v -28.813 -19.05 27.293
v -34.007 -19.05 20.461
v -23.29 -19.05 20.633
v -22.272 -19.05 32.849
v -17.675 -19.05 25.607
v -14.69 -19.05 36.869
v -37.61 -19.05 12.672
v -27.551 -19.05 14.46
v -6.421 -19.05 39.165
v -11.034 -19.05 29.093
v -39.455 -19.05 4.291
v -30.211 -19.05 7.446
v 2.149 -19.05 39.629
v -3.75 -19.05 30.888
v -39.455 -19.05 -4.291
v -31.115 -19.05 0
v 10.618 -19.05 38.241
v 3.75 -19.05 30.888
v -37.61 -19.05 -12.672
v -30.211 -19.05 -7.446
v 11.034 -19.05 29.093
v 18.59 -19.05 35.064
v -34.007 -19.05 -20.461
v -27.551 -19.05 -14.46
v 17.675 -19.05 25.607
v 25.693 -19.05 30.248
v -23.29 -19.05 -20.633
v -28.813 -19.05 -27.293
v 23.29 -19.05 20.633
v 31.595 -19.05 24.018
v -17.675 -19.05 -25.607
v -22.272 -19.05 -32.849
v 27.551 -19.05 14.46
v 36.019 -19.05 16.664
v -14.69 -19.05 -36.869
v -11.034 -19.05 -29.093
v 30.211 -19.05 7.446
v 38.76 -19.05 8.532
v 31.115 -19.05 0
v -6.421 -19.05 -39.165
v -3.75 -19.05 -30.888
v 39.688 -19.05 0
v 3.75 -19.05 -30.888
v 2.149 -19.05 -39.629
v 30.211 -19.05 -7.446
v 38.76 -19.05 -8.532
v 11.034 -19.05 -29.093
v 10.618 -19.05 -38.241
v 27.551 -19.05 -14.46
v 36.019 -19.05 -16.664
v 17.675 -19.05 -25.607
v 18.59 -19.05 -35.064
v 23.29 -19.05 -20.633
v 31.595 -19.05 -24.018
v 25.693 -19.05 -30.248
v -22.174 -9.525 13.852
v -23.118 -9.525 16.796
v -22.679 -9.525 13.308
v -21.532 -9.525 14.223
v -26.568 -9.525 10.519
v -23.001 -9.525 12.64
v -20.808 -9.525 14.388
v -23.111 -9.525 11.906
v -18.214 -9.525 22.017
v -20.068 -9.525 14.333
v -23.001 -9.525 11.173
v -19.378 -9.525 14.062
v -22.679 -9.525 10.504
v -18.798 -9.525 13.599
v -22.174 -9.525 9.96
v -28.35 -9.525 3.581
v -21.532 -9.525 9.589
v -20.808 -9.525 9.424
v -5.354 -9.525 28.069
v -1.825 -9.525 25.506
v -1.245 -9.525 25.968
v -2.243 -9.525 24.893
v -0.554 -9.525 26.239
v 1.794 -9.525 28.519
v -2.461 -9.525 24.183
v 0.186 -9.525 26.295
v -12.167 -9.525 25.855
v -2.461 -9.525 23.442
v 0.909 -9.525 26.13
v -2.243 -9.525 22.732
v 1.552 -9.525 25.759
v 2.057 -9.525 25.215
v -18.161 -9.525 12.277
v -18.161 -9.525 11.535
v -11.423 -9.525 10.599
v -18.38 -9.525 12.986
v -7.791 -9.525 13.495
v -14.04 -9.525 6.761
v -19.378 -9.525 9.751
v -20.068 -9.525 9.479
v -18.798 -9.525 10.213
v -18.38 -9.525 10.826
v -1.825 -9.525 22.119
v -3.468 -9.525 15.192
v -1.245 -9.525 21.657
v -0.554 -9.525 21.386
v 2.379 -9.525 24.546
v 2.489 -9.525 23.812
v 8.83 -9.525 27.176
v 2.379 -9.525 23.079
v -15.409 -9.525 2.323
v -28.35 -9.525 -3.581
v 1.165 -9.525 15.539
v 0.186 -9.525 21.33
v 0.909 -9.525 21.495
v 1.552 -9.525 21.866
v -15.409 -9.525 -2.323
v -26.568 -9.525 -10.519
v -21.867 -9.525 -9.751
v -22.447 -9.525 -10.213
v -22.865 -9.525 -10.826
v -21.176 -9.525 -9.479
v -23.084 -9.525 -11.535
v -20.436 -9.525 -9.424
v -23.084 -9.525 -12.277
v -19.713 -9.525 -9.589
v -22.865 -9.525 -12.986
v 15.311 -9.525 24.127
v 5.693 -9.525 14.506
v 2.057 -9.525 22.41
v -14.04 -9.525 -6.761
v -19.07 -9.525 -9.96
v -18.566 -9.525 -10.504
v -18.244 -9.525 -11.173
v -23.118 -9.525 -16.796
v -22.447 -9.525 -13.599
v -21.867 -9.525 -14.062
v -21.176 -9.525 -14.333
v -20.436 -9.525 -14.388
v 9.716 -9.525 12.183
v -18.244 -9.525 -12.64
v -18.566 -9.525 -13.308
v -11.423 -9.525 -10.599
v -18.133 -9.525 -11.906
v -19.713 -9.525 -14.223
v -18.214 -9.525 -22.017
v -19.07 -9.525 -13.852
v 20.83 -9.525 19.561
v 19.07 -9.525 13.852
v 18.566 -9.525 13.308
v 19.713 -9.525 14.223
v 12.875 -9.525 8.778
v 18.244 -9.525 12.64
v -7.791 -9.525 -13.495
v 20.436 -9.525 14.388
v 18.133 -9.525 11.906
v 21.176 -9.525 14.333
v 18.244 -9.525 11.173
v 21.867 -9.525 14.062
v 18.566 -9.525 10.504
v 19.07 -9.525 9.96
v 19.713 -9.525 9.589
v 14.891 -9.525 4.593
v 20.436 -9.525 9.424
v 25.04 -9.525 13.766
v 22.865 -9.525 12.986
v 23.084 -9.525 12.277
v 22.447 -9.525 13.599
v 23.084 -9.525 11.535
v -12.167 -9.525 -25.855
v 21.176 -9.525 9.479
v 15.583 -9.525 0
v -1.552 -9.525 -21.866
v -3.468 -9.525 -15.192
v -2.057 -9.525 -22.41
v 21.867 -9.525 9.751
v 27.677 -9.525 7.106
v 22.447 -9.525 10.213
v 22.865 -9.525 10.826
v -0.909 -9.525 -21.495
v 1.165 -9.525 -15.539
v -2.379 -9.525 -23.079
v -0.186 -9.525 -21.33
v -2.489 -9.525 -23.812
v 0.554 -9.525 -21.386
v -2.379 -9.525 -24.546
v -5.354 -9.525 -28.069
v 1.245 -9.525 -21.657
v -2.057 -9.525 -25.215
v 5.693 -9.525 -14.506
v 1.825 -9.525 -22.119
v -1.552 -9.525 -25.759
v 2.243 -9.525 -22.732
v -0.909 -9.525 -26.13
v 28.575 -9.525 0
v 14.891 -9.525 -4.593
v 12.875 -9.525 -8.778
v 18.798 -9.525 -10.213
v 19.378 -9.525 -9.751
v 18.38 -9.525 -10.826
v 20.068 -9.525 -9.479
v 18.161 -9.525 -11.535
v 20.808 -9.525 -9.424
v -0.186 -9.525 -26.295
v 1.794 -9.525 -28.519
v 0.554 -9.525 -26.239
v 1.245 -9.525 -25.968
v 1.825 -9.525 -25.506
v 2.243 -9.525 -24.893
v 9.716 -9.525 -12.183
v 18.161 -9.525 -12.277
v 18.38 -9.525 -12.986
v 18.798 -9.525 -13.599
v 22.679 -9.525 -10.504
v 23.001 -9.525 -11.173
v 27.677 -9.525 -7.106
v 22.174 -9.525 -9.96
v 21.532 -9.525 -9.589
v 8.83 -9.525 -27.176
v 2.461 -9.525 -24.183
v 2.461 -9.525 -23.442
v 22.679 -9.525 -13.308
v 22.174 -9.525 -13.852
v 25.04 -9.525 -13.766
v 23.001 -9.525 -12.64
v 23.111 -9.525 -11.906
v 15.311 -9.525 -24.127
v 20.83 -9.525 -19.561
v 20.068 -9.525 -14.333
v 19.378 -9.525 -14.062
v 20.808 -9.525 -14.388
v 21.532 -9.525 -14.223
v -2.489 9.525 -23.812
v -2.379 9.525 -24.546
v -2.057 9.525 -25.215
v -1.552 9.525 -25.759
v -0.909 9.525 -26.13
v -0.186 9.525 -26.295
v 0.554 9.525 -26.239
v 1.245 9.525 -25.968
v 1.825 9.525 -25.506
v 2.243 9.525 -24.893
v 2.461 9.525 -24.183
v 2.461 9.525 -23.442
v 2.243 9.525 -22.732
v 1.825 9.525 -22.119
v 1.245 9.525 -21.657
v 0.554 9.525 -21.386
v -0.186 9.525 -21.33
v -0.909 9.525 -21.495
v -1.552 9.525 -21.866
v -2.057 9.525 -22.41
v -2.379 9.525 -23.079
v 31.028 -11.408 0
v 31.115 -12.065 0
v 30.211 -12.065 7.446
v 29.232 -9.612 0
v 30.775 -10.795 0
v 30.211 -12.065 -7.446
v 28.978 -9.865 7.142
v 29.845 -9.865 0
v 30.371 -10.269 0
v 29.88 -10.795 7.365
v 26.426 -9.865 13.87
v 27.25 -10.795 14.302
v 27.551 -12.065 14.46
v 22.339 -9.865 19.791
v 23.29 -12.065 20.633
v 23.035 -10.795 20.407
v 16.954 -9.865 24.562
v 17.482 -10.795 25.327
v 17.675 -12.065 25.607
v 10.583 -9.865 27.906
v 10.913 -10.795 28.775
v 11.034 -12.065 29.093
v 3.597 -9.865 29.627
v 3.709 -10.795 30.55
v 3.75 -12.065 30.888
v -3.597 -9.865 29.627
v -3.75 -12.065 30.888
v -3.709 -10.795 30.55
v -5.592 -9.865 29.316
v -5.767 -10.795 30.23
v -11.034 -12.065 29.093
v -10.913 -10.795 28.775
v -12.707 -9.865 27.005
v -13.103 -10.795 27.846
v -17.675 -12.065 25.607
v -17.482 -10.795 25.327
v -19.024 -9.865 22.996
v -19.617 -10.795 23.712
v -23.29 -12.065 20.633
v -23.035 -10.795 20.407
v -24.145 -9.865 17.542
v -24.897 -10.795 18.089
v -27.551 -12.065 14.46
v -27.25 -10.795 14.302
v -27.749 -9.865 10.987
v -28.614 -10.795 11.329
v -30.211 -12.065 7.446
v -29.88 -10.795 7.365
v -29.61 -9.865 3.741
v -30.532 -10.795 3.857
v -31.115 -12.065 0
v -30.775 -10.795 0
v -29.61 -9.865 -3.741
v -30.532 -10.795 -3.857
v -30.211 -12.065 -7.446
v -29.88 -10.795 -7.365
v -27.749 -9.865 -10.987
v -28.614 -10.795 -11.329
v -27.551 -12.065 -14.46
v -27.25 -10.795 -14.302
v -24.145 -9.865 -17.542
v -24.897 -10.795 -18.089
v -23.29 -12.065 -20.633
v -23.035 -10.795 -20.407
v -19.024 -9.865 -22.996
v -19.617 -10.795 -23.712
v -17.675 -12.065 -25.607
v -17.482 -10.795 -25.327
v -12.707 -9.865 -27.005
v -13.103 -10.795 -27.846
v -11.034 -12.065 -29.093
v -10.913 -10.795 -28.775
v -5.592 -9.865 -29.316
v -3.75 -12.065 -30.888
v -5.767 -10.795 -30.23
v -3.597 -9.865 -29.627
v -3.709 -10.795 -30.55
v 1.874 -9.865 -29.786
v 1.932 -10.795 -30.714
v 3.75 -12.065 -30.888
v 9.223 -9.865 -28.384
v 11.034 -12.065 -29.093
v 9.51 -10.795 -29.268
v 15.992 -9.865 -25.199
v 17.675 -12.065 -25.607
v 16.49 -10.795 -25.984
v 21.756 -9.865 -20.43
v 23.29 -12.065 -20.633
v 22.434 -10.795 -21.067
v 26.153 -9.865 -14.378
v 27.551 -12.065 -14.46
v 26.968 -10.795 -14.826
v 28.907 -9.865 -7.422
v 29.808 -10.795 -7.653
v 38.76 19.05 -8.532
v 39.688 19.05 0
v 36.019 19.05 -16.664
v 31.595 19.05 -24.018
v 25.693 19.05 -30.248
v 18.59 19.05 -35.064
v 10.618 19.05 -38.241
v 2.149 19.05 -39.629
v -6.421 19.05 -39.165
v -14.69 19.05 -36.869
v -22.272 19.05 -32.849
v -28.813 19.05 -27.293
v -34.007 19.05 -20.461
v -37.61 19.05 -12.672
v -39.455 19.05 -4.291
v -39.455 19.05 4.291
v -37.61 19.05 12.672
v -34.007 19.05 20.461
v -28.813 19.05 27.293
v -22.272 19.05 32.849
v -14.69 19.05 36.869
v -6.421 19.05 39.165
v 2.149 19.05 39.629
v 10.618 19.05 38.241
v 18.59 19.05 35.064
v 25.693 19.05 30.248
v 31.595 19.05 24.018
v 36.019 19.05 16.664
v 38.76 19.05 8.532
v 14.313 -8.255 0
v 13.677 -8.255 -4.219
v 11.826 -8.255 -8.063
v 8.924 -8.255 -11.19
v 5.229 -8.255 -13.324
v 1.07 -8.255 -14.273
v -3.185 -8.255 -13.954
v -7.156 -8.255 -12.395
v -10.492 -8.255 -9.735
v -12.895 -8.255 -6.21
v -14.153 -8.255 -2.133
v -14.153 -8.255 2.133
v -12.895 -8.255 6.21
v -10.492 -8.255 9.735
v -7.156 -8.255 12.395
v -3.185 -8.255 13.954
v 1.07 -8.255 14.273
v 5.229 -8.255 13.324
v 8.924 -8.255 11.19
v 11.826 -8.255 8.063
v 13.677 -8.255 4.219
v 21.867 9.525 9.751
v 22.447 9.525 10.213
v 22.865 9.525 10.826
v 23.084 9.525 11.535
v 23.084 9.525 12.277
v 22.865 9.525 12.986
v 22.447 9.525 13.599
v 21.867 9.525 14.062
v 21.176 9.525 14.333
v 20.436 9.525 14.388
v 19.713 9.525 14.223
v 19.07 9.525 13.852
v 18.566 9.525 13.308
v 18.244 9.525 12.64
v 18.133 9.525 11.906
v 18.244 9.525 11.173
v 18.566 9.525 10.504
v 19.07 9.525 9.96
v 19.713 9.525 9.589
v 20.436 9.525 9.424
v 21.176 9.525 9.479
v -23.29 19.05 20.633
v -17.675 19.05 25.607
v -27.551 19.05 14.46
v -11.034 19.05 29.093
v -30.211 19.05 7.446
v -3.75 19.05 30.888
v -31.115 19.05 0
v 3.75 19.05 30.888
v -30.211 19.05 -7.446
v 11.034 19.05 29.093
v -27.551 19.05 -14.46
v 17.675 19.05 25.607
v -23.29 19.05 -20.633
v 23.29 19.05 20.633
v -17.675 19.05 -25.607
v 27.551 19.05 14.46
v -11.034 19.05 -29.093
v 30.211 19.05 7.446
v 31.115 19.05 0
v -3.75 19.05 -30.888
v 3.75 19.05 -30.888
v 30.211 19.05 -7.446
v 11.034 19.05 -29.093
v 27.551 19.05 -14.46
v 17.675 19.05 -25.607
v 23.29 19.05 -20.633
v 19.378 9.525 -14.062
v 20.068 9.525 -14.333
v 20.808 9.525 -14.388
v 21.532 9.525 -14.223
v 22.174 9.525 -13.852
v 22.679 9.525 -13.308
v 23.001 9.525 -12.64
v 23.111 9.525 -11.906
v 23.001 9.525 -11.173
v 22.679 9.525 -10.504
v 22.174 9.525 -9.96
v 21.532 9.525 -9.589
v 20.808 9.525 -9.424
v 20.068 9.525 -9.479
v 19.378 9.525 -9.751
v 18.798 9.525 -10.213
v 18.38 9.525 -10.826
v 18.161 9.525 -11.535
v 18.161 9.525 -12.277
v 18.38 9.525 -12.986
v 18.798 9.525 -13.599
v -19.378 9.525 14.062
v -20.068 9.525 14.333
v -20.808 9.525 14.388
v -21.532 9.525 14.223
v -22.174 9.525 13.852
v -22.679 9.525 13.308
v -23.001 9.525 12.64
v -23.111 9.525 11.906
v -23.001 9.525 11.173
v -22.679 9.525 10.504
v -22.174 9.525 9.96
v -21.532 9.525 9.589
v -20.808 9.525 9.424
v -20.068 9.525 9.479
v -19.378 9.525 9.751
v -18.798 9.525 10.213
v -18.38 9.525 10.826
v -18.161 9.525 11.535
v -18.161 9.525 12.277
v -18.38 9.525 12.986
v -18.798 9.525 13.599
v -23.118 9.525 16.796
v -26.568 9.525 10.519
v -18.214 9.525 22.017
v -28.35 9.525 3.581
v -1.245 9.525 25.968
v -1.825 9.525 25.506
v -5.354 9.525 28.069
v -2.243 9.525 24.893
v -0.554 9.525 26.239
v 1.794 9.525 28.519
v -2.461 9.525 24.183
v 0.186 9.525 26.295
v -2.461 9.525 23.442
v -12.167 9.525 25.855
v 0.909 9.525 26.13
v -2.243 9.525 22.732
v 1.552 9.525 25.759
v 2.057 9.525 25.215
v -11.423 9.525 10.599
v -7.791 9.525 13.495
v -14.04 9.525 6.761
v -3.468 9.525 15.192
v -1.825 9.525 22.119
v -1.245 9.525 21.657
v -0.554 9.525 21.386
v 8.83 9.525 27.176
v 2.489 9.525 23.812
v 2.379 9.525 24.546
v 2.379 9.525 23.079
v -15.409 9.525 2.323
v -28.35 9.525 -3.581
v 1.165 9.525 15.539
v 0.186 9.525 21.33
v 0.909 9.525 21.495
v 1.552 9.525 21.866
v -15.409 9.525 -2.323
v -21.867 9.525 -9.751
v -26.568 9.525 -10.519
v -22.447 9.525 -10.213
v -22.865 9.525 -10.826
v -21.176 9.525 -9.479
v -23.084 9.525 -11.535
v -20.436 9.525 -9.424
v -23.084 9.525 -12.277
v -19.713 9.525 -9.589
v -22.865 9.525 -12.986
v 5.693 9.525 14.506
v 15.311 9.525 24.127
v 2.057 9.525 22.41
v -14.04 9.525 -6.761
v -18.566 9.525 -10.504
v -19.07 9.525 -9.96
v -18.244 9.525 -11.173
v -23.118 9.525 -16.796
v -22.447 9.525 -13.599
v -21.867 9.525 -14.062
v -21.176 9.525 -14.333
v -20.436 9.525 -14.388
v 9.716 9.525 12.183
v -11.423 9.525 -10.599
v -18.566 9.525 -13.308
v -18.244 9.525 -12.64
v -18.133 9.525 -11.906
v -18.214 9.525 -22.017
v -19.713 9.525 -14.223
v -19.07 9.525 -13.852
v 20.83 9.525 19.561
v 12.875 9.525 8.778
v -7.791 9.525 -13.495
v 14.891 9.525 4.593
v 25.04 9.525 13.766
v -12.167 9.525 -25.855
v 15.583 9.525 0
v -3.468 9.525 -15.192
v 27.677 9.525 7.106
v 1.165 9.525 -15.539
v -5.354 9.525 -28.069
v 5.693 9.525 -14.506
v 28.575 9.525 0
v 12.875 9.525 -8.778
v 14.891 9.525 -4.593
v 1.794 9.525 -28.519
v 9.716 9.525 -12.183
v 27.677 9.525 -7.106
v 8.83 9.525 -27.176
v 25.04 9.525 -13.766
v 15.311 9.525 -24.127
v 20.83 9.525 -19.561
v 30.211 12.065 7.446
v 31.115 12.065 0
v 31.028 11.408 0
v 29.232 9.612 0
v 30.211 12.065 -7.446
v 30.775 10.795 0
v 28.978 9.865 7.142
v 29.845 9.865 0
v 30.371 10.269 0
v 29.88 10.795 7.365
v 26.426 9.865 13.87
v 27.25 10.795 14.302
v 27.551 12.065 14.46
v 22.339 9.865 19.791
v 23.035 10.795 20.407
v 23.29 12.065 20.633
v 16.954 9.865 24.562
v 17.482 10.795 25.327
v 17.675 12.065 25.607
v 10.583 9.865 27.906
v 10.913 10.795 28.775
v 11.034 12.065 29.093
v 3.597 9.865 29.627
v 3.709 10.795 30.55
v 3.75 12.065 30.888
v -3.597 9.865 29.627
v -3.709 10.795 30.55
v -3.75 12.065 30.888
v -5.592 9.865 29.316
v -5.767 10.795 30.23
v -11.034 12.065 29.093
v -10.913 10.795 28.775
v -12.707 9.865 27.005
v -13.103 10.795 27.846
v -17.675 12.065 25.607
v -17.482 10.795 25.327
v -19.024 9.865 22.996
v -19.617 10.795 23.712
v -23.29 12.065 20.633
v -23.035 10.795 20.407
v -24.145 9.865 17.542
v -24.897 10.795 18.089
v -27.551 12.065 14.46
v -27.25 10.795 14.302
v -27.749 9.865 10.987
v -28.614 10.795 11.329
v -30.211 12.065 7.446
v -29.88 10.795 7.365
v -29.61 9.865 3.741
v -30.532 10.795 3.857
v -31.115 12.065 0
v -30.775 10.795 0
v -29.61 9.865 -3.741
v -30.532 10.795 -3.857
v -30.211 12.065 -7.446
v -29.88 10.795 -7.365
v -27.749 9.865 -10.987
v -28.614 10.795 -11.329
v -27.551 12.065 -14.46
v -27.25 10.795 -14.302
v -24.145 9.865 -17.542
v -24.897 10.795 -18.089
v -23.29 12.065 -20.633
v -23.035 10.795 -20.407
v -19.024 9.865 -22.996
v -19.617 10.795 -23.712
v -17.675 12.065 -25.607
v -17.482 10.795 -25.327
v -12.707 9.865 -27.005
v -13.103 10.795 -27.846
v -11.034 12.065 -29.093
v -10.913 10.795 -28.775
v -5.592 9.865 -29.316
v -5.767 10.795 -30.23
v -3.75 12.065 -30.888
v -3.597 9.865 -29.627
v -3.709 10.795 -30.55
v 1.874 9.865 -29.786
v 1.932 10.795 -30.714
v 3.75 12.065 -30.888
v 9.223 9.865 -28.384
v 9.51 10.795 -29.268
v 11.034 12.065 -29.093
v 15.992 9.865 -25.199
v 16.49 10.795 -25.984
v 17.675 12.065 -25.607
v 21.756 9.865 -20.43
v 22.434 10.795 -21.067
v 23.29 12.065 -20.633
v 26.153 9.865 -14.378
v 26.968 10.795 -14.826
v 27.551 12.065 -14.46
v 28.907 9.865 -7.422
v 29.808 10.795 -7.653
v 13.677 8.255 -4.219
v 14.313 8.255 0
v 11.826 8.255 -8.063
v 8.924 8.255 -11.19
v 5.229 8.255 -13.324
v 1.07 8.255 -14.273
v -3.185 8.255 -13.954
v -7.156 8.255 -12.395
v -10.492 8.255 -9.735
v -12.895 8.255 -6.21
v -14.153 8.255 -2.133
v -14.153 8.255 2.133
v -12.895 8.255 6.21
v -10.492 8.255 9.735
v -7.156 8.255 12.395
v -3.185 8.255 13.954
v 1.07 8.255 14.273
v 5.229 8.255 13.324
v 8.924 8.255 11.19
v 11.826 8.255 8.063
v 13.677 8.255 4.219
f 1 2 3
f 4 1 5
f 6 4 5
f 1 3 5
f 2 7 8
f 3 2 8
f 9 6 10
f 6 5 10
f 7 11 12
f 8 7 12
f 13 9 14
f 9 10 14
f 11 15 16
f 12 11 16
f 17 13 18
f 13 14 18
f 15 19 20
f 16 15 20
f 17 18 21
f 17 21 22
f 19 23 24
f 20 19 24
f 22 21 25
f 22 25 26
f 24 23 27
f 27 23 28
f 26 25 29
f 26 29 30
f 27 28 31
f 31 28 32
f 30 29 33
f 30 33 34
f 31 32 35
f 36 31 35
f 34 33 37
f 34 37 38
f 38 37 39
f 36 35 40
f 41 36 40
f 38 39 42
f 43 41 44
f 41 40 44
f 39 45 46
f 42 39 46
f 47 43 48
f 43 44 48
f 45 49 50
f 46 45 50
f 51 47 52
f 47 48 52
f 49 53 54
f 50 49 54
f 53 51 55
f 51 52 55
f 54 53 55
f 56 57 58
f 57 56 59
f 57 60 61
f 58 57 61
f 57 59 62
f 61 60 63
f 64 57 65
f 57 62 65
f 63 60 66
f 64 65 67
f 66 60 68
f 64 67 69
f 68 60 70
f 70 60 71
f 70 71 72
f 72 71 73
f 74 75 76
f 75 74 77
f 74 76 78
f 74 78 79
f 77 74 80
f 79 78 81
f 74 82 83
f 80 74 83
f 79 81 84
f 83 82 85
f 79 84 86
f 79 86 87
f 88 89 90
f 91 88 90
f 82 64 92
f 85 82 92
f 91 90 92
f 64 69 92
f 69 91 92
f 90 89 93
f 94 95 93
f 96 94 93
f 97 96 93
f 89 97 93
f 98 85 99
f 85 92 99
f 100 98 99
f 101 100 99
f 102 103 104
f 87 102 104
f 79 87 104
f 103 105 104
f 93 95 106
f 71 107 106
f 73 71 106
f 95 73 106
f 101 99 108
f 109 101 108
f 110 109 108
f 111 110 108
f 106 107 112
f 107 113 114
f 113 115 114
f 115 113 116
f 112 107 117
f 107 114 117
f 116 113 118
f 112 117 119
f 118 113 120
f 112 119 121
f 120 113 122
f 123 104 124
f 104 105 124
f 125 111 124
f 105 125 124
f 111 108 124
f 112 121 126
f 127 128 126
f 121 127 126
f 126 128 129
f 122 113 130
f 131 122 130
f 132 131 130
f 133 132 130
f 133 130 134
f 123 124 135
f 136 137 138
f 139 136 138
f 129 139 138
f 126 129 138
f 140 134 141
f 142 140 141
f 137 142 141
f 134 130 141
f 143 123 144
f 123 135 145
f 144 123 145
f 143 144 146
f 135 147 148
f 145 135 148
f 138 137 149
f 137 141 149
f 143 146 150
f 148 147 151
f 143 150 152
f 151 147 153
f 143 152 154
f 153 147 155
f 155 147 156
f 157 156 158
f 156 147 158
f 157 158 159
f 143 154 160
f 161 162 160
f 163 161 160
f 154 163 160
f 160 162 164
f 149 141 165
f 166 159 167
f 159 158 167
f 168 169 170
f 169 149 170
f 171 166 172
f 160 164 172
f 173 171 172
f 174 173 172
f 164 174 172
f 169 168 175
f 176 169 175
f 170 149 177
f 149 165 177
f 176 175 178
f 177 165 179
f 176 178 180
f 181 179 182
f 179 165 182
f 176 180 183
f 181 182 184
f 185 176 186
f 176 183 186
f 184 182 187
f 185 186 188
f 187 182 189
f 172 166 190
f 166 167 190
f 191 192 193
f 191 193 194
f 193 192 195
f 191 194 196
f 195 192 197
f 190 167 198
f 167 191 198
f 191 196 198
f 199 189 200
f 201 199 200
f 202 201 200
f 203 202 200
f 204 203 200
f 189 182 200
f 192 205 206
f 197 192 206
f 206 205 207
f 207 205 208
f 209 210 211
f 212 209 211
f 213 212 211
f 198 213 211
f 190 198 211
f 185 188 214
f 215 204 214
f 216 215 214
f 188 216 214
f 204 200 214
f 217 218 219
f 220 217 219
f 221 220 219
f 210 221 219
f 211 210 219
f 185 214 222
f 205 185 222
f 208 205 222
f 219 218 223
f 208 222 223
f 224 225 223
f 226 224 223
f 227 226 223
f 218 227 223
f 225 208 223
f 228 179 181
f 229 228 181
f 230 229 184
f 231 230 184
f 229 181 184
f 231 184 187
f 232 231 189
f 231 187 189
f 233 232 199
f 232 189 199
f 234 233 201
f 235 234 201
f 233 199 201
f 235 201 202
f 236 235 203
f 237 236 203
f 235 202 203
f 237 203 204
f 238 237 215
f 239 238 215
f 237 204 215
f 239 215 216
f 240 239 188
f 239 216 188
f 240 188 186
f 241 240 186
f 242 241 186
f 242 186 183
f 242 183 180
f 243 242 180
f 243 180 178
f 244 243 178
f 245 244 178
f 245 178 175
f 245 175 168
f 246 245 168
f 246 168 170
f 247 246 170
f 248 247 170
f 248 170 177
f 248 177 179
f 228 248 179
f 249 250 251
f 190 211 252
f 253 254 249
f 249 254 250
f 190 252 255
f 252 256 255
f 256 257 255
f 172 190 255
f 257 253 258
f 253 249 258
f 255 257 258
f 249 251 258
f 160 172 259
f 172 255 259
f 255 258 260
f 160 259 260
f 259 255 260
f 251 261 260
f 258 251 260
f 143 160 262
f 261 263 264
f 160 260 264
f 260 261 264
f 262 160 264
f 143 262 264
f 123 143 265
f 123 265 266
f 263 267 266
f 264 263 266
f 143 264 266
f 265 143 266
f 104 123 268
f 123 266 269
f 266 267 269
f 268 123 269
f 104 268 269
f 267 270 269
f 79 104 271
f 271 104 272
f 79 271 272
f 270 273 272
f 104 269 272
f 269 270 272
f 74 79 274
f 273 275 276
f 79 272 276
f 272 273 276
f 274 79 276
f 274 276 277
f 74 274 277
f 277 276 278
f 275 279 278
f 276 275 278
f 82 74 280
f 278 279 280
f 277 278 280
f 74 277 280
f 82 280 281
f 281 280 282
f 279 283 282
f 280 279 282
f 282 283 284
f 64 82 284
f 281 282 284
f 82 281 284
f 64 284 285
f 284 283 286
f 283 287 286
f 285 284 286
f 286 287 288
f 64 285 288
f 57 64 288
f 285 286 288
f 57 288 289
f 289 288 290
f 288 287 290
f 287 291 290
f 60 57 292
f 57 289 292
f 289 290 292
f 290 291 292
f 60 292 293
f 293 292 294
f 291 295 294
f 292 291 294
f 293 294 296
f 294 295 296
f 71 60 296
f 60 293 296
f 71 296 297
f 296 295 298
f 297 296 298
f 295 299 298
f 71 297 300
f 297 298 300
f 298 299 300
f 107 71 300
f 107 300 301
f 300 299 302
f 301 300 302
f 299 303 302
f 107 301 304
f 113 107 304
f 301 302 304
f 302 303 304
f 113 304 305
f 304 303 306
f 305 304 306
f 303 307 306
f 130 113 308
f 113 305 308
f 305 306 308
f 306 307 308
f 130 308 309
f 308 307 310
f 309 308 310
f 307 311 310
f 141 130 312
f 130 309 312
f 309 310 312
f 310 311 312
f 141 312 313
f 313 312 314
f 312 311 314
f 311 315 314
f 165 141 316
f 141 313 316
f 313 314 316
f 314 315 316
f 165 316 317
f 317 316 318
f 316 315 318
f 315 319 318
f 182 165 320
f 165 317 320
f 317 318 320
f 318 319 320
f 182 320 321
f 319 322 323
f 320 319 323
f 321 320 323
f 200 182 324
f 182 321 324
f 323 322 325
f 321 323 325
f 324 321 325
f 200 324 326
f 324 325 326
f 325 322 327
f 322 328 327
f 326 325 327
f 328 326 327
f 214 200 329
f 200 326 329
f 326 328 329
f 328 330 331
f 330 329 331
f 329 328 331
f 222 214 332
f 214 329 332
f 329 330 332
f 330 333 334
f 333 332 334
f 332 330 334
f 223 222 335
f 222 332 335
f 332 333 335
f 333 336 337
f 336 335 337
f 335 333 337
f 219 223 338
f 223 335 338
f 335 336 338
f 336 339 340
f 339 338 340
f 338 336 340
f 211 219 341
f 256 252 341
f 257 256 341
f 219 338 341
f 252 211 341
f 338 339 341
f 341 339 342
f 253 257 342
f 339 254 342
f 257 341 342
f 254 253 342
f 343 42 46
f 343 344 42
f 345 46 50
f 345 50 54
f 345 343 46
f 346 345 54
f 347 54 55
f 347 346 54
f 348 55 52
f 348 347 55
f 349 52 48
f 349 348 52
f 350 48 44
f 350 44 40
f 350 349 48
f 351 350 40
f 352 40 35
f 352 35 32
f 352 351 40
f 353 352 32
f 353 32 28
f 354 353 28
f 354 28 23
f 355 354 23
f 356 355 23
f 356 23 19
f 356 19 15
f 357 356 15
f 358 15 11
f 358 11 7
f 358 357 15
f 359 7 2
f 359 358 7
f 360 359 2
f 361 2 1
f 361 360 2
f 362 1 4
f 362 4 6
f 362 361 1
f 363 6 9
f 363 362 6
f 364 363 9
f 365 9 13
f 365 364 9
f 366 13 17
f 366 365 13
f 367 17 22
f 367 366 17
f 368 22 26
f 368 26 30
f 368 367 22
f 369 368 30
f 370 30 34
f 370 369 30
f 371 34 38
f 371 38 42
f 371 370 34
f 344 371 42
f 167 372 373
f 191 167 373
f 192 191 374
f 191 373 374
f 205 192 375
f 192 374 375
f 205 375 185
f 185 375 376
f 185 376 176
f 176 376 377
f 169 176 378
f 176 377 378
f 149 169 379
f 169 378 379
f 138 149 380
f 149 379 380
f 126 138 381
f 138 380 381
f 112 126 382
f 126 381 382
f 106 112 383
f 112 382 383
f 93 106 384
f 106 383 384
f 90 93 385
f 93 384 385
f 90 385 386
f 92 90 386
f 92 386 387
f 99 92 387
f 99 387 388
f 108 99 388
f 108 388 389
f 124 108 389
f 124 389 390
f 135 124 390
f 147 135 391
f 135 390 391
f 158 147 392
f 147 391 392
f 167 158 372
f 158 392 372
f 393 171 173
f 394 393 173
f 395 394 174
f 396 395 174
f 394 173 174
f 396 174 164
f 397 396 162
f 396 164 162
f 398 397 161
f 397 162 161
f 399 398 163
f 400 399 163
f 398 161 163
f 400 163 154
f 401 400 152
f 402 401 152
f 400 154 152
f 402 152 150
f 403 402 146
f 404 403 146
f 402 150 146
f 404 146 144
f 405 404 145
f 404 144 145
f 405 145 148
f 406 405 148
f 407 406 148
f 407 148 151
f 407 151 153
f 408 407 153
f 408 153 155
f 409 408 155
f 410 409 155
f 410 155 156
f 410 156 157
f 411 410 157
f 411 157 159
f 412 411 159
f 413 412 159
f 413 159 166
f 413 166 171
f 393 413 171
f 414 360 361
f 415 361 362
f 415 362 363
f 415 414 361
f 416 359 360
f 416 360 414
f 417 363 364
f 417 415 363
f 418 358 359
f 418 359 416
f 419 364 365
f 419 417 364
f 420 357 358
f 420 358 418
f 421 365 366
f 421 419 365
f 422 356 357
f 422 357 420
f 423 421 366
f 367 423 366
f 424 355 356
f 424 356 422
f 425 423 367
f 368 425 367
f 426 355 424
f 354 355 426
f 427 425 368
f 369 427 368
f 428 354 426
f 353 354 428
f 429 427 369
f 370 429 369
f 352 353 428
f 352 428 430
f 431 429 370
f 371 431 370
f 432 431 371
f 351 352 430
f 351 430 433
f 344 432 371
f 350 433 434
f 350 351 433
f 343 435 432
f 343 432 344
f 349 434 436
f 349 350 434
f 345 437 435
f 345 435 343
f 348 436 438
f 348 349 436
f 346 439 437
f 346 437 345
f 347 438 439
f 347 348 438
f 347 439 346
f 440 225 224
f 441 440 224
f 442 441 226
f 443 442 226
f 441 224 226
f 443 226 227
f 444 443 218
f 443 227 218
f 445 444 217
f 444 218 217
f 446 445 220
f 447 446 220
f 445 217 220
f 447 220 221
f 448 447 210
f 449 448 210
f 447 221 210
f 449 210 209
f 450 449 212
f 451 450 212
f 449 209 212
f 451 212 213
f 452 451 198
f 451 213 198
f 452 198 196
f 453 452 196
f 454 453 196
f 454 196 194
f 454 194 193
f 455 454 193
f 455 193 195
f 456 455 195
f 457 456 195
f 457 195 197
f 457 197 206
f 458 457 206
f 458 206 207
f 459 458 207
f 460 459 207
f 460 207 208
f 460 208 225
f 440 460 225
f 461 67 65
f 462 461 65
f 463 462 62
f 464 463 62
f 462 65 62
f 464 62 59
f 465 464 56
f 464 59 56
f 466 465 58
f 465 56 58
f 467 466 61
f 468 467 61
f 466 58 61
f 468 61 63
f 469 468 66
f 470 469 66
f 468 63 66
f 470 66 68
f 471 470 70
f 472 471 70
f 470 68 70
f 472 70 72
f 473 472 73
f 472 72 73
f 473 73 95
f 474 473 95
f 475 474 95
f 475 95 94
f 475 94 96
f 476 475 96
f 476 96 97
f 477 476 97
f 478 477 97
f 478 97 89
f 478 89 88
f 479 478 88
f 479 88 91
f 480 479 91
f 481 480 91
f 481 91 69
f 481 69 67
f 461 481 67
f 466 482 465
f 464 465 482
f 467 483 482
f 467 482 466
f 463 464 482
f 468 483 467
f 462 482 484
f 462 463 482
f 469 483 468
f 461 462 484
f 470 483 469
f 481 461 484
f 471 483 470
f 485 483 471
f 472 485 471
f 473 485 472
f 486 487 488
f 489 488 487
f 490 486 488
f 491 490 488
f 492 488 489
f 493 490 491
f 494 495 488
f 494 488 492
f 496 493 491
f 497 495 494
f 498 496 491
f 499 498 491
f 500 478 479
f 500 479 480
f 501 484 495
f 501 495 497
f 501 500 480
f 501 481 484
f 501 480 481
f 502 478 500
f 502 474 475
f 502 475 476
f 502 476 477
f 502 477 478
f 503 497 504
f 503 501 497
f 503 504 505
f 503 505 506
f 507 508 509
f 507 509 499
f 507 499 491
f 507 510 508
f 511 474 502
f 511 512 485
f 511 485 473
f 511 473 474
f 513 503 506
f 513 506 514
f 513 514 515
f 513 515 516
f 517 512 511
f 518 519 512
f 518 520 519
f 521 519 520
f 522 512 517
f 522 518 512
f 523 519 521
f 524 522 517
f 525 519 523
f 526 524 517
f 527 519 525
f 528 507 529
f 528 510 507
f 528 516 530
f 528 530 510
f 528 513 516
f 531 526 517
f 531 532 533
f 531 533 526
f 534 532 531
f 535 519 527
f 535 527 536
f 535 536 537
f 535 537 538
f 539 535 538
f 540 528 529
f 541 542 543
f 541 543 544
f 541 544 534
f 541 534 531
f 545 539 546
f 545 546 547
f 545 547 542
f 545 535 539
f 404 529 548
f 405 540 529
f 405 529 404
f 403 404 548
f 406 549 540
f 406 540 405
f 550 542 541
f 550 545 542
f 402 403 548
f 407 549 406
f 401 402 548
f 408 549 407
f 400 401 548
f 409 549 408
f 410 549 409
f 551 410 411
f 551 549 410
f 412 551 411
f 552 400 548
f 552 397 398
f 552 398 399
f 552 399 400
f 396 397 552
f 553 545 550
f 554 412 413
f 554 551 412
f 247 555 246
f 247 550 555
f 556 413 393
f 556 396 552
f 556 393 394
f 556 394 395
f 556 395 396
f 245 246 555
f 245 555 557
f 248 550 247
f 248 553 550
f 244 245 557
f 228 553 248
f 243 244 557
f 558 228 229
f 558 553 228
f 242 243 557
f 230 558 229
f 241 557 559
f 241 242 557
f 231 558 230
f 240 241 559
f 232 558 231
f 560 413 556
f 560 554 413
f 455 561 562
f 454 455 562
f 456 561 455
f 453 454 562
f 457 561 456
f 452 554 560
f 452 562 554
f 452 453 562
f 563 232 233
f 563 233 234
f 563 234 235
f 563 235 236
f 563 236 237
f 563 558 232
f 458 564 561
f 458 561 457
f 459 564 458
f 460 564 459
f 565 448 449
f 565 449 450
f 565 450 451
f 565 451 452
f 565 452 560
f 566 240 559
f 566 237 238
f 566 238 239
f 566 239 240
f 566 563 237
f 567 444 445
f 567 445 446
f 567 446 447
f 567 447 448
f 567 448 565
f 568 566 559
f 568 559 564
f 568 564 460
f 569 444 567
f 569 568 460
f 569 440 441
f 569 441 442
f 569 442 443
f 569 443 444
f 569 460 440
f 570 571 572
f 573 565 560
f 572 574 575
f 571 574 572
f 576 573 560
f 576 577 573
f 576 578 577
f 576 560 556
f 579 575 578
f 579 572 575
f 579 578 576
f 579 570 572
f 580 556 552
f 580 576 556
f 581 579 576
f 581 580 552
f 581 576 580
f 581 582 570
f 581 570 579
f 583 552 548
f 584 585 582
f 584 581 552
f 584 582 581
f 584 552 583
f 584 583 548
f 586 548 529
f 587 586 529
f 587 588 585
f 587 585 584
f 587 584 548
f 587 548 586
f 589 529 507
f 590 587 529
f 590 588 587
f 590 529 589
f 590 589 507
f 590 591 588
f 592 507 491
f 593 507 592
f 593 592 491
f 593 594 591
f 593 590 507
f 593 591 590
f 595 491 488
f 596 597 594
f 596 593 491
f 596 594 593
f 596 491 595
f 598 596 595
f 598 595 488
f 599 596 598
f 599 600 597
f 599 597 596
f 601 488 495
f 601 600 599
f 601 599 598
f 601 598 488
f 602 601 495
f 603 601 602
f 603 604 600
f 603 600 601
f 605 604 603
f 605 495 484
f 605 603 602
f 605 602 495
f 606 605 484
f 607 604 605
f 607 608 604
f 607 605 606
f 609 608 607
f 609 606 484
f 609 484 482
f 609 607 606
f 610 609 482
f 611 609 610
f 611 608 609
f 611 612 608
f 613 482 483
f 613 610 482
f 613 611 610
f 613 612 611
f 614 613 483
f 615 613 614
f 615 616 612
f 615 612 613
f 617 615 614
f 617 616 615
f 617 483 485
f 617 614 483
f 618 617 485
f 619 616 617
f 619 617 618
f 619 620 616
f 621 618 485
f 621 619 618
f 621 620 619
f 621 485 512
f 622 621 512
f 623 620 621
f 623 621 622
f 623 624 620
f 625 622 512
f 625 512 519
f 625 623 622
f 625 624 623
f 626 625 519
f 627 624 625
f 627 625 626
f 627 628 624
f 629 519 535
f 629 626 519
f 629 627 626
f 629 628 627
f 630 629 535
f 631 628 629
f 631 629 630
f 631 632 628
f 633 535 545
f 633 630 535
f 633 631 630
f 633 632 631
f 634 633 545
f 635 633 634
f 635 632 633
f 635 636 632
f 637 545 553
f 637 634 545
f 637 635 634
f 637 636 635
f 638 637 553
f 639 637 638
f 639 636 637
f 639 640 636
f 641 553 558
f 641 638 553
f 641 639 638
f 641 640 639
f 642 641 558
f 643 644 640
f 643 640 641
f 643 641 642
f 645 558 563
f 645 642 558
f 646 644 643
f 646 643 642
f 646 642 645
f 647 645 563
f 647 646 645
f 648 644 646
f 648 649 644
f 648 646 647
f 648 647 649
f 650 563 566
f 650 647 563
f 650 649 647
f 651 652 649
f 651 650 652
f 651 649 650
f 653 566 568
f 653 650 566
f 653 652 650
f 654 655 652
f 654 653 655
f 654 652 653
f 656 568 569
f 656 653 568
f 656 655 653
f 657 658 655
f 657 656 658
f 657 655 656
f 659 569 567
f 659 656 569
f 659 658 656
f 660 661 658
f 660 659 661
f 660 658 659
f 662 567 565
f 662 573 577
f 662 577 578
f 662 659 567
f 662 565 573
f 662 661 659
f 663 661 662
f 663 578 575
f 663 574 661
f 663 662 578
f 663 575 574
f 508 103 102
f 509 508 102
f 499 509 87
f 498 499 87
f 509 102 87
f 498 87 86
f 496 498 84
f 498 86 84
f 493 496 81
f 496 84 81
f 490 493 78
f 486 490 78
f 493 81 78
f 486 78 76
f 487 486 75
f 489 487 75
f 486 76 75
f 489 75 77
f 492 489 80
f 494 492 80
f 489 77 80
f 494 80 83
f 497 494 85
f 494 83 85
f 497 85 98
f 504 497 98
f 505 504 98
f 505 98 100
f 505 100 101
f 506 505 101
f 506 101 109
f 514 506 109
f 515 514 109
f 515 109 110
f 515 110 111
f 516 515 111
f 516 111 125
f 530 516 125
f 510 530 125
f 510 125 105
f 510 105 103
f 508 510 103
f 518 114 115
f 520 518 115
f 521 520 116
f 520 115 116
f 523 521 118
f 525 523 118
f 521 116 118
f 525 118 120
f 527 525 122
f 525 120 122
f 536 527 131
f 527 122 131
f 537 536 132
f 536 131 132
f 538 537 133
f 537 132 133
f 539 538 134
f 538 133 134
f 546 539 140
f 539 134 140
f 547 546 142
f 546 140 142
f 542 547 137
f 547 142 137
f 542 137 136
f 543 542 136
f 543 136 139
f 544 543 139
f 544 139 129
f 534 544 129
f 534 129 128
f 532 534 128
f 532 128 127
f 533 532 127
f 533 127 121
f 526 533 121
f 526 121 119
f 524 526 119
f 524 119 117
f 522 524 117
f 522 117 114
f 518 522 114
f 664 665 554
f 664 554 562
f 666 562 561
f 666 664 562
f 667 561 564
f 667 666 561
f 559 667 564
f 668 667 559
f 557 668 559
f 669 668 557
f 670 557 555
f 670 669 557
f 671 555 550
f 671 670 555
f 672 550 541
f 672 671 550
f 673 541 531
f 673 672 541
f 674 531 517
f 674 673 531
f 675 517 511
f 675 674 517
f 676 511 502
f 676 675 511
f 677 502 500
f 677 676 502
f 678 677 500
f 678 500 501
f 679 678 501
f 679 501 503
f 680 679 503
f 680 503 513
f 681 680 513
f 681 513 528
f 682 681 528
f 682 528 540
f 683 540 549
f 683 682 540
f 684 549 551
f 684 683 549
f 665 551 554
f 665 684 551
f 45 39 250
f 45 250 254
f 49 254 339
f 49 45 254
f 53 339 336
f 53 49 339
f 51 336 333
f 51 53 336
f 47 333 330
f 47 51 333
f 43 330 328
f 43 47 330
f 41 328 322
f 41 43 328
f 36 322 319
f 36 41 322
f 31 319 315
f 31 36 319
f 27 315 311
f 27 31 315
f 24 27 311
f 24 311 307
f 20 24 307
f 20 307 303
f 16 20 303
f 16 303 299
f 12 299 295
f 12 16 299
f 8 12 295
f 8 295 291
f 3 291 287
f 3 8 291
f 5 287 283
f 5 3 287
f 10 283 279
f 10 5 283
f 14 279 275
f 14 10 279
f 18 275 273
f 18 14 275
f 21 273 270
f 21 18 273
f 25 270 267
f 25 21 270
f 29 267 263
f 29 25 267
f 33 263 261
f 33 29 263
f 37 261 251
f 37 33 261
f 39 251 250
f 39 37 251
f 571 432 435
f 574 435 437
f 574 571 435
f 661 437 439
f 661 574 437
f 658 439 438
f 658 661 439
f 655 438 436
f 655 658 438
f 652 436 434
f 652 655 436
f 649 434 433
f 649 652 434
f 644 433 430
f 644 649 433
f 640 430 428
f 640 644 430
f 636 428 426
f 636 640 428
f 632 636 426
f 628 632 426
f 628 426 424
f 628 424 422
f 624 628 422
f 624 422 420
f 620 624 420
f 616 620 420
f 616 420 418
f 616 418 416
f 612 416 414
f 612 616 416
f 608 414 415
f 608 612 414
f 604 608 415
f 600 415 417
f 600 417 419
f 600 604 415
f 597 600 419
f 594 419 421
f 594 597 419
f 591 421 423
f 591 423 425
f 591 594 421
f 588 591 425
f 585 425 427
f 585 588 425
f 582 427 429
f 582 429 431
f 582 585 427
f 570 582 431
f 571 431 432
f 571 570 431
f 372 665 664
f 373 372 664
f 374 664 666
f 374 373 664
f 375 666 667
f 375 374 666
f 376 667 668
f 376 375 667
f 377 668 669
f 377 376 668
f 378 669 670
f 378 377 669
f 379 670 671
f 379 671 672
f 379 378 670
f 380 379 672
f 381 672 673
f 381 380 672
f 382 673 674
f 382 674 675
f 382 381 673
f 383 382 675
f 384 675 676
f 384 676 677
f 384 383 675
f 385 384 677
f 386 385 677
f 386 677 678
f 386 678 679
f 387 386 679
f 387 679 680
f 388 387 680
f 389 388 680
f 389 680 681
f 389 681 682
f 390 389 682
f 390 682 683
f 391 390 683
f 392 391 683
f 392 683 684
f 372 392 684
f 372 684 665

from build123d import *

# Parameters (mm, degrees)
SKETCH1_R              = 38.1
SKETCH1_R_2            = 14.3129
BOSS_EXTRUDE1_DEPTH    = 9.525
SKETCH2_R              = 39.6875
SKETCH2_R_2            = 31.115
BOSS_EXTRUDE2_DEPTH    = 19.05
F_10_CLEARANCE_HOLE1_D = 4.9784
CIRPATTERN1_COUNT      = 6
CHAMFER1_SIZE          = 1.27
FILLET2_R              = 2.54


with BuildPart() as part:
    # Sketch1 → Boss-Extrude1 (new body, symmetric)
    with BuildSketch(Plane(origin=(0, 0, 0), x_dir=(1, 0, 0), z_dir=(0, 1, 0))):
        Circle(SKETCH1_R)
        Circle(SKETCH1_R_2, mode=Mode.SUBTRACT)
    extrude(amount=BOSS_EXTRUDE1_DEPTH, both=True)

    # Sketch2 → Boss-Extrude2 (add, symmetric)
    with BuildSketch(Plane(origin=(0, 0, 0), x_dir=(1, 0, 0), z_dir=(0, 1, 0))):
        Circle(SKETCH2_R)
        Circle(SKETCH2_R_2, mode=Mode.SUBTRACT)
    extrude(amount=BOSS_EXTRUDE2_DEPTH, both=True)

    # #10 Clearance Hole1 (through all)
    with Locations(Plane(origin=(0, 9.525, 0), x_dir=(1, 0, 0), z_dir=(0, 1, 0))):
        with Locations((0, 23.8125)):
            f_10_clearance_hole1 = Hole(F_10_CLEARANCE_HOLE1_D / 2)

    # CirPattern1: #10 Clearance Hole1 ×6 about axis
    cirpattern1_axis = Axis((0, 0, 0), (0, 1, 0))
    for i in range(1, CIRPATTERN1_COUNT):
        add(f_10_clearance_hole1.rotate(cirpattern1_axis, i * 360 / CIRPATTERN1_COUNT), mode=Mode.SUBTRACT)

    # Chamfer1
    chamfer1_edges = [part.edges().sort_by_distance(p)[0] for p in [
        (-14.3129, -9.525, 0),
        (-14.3129, 9.525, 0),
    ]]
    chamfer(chamfer1_edges, length=CHAMFER1_SIZE)

    # Fillet2
    fillet2_edges = [part.edges().sort_by_distance(p)[0] for p in [
        (-31.115, 9.525, 0),
        (-31.115, -9.525, 0),
    ]]
    fillet(fillet2_edges, radius=FILLET2_R)


solid = part.part
